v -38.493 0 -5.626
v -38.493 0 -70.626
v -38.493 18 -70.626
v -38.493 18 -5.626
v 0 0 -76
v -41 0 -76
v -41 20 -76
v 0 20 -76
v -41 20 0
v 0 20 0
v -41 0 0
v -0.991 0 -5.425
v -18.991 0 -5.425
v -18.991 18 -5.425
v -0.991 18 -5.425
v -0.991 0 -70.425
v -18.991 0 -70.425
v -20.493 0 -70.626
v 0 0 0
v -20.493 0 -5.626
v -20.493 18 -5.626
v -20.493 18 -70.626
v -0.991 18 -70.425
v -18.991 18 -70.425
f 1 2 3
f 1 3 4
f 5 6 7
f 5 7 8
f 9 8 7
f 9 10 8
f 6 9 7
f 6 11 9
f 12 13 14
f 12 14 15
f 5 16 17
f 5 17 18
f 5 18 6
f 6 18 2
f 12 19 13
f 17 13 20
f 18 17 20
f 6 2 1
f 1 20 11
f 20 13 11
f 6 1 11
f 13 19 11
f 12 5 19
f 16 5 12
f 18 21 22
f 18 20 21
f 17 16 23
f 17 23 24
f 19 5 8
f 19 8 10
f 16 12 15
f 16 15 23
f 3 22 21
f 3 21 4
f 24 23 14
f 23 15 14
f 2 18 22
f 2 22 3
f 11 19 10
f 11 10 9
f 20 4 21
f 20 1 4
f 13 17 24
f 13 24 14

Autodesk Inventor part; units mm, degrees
ref_plane "YZ Plane" through (0, 0, 0) normal (1, 0, 0) x (0, 1, 0)
ref_plane "XZ Plane" through (0, 0, 0) normal (0, 1, 0) x (-1, 0, 0)
ref_plane "XY Plane" through (0, 0, 0) normal (0, 0, 1) x (1, 0, 0)
sketch "Эскиз1" plane through (0, 0, 0) normal (0, 1, 0) x (-1, 0, 0)
  line L0 (0, 0) -> (41, 0)
  line L1 (41, 0) -> (41, -76)
  line L2 (41, -76) -> (0, -76)
  line L3 (0, -76) -> (0, 0)
  line L4 (38.493, -5.6262) -> (20.493, -5.6262)
  line L5 (20.493, -5.6262) -> (20.493, -70.6262)
  line L6 (20.493, -70.6262) -> (38.493, -70.6262)
  line L7 (38.493, -70.6262) -> (38.493, -5.6262)
  line L8 (18.991, -5.4252) -> (0.991, -5.4252)
  line L9 (0.991, -5.4252) -> (0.991, -70.4252)
  line L10 (0.991, -70.4252) -> (18.991, -70.4252)
  line L11 (18.991, -70.4252) -> (18.991, -5.4252)
  dimension "d0" = 41
  dimension "d1" = 76
  dimension "d2" = 18
  dimension "d3" = 65
  dimension "d4" = 18
  dimension "d5" = 65
extrude "Выдавливание1" add sketch "Эскиз1" along normal blind 20 contours L0 L1 L2 L3 | L7 L6 L5 L4 | L11 L10 L9 L8
extrude "Выдавливание2" cut sketch "Эскиз1" along normal blind 18 contours L7 L6 L5 L4 | L11 L10 L9 L8
properties part number "Battery_Holder"
